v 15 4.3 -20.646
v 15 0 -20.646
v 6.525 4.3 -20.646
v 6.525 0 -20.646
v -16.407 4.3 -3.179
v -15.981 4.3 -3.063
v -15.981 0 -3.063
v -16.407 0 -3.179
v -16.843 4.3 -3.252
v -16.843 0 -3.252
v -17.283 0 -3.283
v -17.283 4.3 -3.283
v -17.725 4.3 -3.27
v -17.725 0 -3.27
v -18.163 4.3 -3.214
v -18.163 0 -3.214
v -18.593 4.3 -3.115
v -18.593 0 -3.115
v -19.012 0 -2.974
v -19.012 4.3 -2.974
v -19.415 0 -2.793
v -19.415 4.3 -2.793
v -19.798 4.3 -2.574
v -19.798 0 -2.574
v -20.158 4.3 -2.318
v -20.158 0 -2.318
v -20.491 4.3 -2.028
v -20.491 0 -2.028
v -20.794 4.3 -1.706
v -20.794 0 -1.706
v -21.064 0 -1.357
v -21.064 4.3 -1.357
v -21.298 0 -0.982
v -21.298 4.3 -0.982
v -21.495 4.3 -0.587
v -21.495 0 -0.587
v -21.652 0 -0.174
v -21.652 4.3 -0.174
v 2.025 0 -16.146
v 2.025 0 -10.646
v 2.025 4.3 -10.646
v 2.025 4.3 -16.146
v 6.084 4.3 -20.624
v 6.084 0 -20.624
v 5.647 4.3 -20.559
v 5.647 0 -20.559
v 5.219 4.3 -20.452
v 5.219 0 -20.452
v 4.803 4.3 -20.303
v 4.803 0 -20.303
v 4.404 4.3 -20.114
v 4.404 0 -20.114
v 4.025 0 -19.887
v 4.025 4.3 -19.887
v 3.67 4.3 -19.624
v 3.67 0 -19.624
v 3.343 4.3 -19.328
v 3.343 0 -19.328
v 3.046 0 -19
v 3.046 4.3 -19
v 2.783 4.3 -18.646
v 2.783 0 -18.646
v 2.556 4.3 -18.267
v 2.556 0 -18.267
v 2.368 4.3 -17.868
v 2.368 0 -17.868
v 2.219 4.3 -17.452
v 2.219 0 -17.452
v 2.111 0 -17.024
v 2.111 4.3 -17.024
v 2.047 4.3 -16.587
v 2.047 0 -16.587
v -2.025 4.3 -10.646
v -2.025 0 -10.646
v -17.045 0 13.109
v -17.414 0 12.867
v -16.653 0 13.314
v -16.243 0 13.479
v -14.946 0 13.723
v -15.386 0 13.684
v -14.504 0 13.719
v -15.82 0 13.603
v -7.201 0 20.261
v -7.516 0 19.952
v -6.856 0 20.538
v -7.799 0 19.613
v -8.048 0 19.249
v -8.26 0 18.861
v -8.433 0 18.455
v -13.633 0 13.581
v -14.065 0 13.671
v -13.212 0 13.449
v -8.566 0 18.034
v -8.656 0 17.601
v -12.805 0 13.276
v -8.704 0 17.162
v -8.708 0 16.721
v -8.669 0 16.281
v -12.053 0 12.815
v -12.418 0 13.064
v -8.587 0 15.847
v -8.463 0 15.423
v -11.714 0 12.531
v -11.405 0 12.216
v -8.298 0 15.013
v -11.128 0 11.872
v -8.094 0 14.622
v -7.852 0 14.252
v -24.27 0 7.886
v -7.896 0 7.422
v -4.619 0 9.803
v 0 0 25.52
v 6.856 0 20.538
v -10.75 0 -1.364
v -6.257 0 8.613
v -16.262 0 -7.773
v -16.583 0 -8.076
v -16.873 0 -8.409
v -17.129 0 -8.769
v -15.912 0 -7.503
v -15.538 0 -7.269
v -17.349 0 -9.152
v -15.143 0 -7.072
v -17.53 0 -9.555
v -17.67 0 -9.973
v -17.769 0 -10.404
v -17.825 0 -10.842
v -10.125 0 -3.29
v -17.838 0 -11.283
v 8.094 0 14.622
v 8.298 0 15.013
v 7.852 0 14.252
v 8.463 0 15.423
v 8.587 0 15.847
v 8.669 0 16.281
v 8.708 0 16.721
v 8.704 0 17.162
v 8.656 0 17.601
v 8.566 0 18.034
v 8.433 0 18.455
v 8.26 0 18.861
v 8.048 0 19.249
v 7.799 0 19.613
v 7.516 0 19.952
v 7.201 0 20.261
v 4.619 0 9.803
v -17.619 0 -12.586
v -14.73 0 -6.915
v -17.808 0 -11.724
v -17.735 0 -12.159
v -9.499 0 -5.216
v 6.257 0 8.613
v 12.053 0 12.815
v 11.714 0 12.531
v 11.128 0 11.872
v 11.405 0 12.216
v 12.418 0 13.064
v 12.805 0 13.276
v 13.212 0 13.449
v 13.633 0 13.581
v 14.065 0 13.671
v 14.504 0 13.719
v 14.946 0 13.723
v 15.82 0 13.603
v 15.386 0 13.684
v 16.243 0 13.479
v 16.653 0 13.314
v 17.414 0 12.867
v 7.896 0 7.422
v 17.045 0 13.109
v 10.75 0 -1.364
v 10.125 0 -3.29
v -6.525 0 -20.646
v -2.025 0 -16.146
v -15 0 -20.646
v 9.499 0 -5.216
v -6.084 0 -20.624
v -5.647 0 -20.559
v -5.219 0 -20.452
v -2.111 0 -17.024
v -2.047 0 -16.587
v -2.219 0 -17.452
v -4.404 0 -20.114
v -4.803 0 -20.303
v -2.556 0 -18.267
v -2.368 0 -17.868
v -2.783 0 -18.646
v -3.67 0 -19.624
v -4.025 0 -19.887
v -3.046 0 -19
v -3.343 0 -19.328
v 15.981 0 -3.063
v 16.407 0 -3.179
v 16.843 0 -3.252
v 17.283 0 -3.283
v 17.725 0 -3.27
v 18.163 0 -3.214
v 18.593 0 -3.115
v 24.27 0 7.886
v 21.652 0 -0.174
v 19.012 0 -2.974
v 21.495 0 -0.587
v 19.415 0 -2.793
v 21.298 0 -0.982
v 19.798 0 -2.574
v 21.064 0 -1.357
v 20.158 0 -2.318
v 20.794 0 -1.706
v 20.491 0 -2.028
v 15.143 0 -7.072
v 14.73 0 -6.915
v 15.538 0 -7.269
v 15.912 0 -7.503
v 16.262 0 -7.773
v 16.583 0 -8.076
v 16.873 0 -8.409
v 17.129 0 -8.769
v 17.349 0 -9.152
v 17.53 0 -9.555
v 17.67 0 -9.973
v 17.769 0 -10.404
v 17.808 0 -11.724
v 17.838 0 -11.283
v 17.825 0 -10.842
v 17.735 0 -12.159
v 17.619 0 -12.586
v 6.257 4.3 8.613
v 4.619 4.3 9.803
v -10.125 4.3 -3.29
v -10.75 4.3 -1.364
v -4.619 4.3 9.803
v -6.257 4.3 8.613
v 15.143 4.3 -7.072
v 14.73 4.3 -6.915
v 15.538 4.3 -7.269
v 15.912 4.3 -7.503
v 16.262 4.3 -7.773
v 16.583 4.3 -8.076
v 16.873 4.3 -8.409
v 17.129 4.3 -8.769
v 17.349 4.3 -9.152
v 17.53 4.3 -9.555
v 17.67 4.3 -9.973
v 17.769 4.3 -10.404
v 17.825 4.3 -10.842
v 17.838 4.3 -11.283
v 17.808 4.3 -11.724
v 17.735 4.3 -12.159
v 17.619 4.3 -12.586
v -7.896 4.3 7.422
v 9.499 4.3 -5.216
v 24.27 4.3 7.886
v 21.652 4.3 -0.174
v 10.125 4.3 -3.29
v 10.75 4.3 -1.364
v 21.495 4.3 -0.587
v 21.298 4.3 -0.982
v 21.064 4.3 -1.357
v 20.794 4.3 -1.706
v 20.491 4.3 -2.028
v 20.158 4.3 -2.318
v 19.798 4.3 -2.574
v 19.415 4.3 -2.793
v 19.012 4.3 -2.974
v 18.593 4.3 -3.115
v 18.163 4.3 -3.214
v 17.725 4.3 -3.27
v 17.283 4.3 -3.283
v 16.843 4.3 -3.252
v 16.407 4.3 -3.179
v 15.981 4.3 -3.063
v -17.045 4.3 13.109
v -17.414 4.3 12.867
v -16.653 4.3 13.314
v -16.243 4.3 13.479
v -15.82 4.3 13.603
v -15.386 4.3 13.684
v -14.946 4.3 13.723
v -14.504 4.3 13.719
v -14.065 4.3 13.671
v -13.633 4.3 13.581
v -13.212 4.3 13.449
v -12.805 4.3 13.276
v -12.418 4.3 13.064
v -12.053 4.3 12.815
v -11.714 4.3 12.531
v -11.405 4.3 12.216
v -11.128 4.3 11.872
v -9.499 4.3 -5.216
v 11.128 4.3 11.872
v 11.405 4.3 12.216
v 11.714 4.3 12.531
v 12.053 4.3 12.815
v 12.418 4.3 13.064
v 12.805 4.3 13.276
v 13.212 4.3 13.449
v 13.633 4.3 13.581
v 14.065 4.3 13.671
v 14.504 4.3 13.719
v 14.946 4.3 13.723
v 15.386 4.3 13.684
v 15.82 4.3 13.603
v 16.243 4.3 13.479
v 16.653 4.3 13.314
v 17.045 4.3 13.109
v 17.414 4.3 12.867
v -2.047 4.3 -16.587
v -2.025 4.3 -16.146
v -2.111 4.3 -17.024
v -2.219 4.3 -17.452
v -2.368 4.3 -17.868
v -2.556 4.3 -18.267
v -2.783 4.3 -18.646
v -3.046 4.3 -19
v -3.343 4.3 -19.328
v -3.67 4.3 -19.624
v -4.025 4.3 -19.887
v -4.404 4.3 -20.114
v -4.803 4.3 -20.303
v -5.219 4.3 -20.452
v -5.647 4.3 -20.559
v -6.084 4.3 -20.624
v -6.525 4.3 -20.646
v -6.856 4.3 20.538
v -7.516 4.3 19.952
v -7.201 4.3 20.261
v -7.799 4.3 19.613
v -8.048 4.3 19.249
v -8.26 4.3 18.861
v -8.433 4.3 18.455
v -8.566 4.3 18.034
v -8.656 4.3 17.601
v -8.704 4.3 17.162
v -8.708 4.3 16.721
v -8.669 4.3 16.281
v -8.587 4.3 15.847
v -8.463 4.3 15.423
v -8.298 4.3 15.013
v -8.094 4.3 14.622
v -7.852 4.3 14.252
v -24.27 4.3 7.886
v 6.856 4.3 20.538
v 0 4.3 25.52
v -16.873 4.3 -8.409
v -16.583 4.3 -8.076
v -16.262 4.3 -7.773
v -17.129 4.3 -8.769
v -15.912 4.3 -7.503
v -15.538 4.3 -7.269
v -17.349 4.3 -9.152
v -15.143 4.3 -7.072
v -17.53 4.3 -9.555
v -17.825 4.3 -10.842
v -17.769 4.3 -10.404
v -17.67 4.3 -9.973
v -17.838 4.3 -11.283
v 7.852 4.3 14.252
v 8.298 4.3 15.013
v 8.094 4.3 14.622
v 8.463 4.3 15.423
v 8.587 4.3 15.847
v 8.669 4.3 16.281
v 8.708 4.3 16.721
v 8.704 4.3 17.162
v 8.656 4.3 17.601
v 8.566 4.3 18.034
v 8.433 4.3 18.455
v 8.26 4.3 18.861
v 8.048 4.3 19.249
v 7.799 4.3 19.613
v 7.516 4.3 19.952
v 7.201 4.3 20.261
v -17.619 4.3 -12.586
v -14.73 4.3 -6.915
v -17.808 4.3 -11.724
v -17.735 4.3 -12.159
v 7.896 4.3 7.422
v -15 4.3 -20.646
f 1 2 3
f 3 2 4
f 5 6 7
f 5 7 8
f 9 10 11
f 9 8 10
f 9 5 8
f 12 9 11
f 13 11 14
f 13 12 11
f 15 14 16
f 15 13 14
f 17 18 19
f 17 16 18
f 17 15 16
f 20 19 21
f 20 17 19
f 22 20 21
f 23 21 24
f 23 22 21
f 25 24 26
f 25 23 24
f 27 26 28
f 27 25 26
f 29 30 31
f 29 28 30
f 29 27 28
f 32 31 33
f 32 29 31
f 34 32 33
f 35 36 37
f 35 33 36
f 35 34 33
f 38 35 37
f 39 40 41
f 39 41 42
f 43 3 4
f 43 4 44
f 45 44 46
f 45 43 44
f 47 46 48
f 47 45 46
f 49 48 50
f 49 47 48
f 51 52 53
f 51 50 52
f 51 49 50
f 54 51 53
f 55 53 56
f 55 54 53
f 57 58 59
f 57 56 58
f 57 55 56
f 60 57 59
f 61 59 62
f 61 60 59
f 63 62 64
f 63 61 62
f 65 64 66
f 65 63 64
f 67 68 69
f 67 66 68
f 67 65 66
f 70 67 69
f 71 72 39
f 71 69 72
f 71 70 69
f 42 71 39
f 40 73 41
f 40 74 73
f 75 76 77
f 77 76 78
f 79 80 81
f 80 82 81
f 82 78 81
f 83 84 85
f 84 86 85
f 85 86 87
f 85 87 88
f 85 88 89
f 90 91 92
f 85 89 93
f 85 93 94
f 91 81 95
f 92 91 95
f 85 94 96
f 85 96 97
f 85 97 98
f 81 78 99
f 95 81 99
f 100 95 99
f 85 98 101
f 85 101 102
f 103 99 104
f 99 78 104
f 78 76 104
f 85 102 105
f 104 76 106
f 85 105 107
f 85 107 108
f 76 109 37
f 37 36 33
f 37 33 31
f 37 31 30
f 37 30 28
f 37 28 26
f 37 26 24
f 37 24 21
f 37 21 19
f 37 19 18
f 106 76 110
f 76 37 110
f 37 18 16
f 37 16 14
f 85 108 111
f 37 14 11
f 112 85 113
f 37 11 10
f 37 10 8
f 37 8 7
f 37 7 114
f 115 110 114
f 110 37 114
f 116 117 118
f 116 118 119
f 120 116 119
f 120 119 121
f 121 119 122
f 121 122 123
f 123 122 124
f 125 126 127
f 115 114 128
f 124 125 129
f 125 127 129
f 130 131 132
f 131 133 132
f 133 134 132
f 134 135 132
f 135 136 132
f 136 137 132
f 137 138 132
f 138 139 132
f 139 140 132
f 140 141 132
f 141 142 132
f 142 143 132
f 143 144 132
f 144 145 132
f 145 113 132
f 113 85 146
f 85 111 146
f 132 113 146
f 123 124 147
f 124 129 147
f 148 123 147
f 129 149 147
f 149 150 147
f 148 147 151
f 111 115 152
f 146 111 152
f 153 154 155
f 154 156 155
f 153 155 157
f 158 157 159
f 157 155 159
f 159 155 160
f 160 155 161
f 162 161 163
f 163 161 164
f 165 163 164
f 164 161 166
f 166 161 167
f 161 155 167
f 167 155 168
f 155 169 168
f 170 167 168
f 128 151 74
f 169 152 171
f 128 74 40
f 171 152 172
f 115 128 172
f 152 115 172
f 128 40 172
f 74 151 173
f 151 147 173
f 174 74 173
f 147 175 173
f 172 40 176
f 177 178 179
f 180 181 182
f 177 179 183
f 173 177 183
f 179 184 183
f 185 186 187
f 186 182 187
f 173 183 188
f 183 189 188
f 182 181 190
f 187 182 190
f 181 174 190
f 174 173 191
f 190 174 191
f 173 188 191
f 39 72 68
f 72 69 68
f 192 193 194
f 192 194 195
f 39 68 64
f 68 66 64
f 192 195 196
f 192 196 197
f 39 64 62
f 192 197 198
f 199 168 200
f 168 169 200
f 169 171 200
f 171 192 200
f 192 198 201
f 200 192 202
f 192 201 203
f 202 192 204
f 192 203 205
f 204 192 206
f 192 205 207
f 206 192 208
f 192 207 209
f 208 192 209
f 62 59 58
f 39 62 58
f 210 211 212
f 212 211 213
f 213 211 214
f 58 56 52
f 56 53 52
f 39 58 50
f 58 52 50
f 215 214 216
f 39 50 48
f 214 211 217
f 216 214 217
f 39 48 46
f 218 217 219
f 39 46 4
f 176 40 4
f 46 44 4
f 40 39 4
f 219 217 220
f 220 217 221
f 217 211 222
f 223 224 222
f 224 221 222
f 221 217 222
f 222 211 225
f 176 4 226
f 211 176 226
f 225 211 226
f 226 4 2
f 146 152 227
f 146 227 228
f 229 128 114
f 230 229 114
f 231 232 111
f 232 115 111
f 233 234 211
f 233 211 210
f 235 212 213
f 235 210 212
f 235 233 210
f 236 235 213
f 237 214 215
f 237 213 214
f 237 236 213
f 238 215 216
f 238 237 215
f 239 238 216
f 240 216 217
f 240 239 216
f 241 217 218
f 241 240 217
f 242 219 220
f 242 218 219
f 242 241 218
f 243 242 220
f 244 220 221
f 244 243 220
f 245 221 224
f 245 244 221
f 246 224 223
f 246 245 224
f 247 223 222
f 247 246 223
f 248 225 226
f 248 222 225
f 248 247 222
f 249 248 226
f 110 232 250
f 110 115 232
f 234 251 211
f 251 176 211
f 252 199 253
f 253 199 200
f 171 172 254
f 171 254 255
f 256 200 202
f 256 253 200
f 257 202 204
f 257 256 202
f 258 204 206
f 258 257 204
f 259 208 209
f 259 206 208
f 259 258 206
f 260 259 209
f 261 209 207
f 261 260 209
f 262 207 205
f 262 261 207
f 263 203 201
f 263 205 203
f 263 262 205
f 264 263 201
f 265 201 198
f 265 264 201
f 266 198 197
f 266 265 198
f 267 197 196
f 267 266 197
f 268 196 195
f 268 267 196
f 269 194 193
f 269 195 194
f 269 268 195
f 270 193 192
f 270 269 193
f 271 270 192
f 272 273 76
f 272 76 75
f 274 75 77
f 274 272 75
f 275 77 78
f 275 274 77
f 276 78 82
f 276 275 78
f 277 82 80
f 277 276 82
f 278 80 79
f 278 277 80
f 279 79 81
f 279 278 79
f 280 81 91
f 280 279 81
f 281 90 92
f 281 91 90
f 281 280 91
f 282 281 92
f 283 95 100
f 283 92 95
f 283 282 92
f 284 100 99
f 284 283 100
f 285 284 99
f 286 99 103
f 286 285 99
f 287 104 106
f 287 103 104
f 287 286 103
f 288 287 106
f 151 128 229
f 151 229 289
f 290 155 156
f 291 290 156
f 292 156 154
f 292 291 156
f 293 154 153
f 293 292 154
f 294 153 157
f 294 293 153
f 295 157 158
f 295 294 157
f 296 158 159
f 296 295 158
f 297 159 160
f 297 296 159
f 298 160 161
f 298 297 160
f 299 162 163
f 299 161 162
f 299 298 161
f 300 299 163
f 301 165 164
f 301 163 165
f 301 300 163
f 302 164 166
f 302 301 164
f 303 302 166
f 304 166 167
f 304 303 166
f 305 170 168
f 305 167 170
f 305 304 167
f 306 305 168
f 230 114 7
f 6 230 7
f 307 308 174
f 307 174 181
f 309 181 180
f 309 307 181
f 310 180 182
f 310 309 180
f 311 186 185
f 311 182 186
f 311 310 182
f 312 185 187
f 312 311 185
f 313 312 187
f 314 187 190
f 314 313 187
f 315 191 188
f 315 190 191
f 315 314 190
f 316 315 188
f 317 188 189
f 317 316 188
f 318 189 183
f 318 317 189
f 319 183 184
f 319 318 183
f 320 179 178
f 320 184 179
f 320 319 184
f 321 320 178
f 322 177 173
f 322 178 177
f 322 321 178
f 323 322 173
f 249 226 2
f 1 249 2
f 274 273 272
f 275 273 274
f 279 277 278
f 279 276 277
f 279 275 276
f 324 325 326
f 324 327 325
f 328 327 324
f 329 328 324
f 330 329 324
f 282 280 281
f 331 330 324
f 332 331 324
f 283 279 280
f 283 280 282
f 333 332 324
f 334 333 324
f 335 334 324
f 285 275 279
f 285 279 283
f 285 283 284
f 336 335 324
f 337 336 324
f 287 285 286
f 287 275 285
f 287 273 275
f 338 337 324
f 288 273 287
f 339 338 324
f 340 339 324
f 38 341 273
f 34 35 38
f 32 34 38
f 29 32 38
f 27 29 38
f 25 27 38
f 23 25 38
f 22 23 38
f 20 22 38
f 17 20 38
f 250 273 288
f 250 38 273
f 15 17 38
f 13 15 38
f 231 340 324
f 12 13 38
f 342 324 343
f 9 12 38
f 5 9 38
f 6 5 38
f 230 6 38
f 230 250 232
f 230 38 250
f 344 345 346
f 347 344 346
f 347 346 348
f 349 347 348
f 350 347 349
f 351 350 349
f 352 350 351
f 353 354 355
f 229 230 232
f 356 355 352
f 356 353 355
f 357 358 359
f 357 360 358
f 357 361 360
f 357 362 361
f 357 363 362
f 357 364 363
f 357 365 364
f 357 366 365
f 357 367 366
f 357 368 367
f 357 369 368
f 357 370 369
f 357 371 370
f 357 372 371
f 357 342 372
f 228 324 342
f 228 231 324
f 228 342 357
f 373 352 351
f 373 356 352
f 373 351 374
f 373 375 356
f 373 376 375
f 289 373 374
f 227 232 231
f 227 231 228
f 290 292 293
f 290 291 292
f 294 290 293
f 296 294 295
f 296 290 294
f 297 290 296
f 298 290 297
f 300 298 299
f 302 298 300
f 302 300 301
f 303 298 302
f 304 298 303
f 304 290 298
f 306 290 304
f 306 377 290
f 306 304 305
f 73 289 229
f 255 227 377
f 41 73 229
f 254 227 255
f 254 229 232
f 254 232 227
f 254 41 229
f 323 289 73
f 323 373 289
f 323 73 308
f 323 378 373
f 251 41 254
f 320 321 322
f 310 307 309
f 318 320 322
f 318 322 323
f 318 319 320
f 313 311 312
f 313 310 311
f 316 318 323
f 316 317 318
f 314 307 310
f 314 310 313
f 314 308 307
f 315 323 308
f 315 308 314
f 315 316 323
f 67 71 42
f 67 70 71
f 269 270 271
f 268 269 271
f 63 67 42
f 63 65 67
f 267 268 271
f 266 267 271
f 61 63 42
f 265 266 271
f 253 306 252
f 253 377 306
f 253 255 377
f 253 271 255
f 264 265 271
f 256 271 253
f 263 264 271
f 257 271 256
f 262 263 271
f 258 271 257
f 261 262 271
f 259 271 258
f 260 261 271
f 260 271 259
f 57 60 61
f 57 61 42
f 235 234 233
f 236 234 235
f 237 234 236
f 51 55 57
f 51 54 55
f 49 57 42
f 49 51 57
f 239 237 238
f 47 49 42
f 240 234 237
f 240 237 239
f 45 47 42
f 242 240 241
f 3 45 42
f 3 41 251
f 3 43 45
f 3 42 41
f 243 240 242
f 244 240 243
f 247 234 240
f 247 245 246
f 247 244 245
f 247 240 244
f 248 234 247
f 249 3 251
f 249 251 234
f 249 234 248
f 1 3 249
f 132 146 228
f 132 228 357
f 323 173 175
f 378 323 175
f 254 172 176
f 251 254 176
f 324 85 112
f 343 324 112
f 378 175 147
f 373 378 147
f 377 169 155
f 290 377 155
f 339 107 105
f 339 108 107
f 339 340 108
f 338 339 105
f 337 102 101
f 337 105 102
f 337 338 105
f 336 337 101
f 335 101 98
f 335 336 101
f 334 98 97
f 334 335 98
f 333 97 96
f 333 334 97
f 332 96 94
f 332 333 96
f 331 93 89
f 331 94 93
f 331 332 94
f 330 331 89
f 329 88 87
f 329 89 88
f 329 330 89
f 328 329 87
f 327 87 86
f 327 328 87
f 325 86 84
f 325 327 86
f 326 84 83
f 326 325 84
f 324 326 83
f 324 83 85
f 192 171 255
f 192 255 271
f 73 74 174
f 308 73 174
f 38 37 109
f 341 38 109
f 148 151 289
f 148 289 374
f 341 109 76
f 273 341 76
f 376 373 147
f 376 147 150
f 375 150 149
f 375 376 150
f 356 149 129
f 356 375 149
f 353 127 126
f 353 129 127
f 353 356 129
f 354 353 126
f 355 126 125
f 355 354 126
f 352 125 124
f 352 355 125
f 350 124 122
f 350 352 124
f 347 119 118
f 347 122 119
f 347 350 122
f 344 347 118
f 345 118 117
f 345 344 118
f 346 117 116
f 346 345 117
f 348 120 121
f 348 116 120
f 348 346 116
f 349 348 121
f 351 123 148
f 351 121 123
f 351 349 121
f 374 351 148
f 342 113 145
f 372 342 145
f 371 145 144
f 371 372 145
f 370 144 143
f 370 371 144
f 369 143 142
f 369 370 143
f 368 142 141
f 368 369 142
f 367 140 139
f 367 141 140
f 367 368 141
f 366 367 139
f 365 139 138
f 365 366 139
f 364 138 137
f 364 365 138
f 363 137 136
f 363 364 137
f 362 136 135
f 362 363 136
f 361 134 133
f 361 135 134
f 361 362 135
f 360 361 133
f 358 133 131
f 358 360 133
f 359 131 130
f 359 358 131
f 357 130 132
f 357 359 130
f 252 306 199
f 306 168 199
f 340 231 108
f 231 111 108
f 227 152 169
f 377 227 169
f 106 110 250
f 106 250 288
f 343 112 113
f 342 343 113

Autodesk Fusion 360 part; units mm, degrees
sketch "Sketch1" plane through (0, 0, 0) normal (0, 1, 0) x (1, 0, 0)
  line L0 (0, 10.6457) -> (2.025, 10.6457)
  line L1 (2.025, 10.6457) -> (2.025, 20.6457)
  line L2 (-2.025, 10.6457) -> (-2.025, 20.6457)
  line L3 (0, 10.6457) -> (-2.025, 10.6457)
  line L4 (-9.4989, 5.2156) -> (-19.0095, 8.3058)
  line L5 (-10.7504, 1.3638) -> (-20.261, 4.454)
  line L6 (-10.1247, 3.2897) -> (-10.7504, 1.3638)
  line L7 (-10.1247, 3.2897) -> (-9.4989, 5.2156)
  line L8 (-7.8957, -7.4223) -> (-13.7735, -15.5125)
  line L9 (-4.6191, -9.8028) -> (-10.497, -17.893)
  line L10 (-6.2574, -8.6126) -> (-4.6191, -9.8028)
  line L11 (-6.2574, -8.6126) -> (-7.8957, -7.4223)
  line L12 (4.6191, -9.8028) -> (10.497, -17.893)
  line L13 (7.8957, -7.4223) -> (13.7735, -15.5125)
  line L14 (6.2574, -8.6126) -> (7.8957, -7.4223)
  line L15 (6.2574, -8.6126) -> (4.6191, -9.8028)
  line L16 (10.7504, 1.3638) -> (20.261, 4.454)
  line L17 (9.4989, 5.2156) -> (19.0095, 8.3058)
  line L18 (10.1247, 3.2897) -> (9.4989, 5.2156)
  line L19 (10.1247, 3.2897) -> (10.7504, 1.3638)
  line L20 (-24.2705, -7.886) -> (-13.7735, -15.5125)
  line L21 (-10.497, -17.893) -> (0, -25.5195)
  line L22 (-15, 20.6457) -> (-19.0095, 8.3058)
  line L23 (-20.261, 4.454) -> (-24.2705, -7.886)
  line L24 (15, 20.6457) -> (2.025, 20.6457)
  line L25 (-2.025, 20.6457) -> (-15, 20.6457)
  line L26 (24.2705, -7.886) -> (20.261, 4.454)
  line L27 (19.0095, 8.3058) -> (15, 20.6457)
  line L28 (0, -25.5195) -> (10.497, -17.893)
  line L29 (13.7735, -15.5125) -> (24.2705, -7.886)
  dimension "d9" = 360
extrude "Extrude1" add sketch "Sketch1" along normal blind 4.3
fillet "Fillet1" radius 4.5 10 edges at (-2.025, 2.15, -20.6457) (2.025, 2.15, -20.6457) (19.0095, 2.15, -8.3058) (20.261, 2.15, -4.454) (10.497, 2.15, 17.893) (13.7735, 2.15, 15.5125) (-19.0095, 2.15, -8.3058) (-20.261, 2.15, -4.454) (-13.7735, 2.15, 15.5125) (-10.497, 2.15, 17.893)
sketch "Sketch2" plane through (0, 4.3, 0) normal (0, 1, 0) x (-1, 0, 0)
  arc A0 (7.852, 14.2524) -> (6.8564, 20.538) centre (4.2114, 16.8975) ccw
  line L0 (6.8564, 20.538) -> (0, 25.5195)
  line L1 (0, 25.5195) -> (-6.8564, 20.538)
  arc A1 (-6.8564, 20.538) -> (-7.852, 14.2524) centre (-4.2114, 16.8975) ccw
  line L2 (-7.852, 14.2524) -> (-4.6191, 9.8028)
  line L3 (-4.6191, 9.8028) -> (-7.8957, 7.4223)
  line L4 (-7.8957, 7.4223) -> (-11.1285, 11.8719)
  arc A2 (-11.1285, 11.8719) -> (-17.4141, 12.8674) centre (-14.7691, 9.2269) ccw
  line L5 (-17.4141, 12.8674) -> (-24.2705, 7.886)
  line L6 (-24.2705, 7.886) -> (-21.6516, -0.1742)
  arc A3 (-21.6516, -0.1742) -> (-15.9813, -3.0634) centre (-17.3718, 1.2163) ccw
  line L7 (-15.9813, -3.0634) -> (-10.7504, -1.3638)
  line L8 (-10.7504, -1.3638) -> (-9.4989, -5.2156)
  line L9 (-9.4989, -5.2156) -> (-14.7297, -6.9152)
  arc A4 (-14.7297, -6.9152) -> (-17.6189, -12.5855) centre (-13.3392, -11.1949) ccw
  line L10 (-17.6189, -12.5855) -> (-15, -20.6457)
  line L11 (-15, -20.6457) -> (-6.525, -20.6457)
  arc A5 (-6.525, -20.6457) -> (-2.025, -16.1457) centre (-6.525, -16.1457) ccw
  line L12 (-2.025, -16.1457) -> (-2.025, -10.6457)
  line L13 (-2.025, -10.6457) -> (2.025, -10.6457)
  line L14 (2.025, -10.6457) -> (2.025, -16.1457)
  arc A6 (2.025, -16.1457) -> (6.525, -20.6457) centre (6.525, -16.1457) ccw
  line L15 (6.525, -20.6457) -> (15, -20.6457)
  line L16 (15, -20.6457) -> (17.6189, -12.5855)
  arc A7 (17.6189, -12.5855) -> (14.7297, -6.9152) centre (13.3392, -11.1949) ccw
  line L17 (14.7297, -6.9152) -> (9.4989, -5.2156)
  line L18 (9.4989, -5.2156) -> (10.7504, -1.3638)
  line L19 (10.7504, -1.3638) -> (15.9813, -3.0634)
  arc A8 (15.9813, -3.0634) -> (21.6516, -0.1742) centre (17.3718, 1.2163) ccw
  line L20 (21.6516, -0.1742) -> (24.2705, 7.886)
  line L21 (24.2705, 7.886) -> (17.4141, 12.8674)
  arc A9 (17.4141, 12.8674) -> (11.1285, 11.8719) centre (14.7691, 9.2269) ccw
  line L22 (11.1285, 11.8719) -> (7.8957, 7.4223)
  line L23 (7.8957, 7.4223) -> (4.6191, 9.8028)
  line L24 (4.6191, 9.8028) -> (7.852, 14.2524)
equation "thickness = 4.3 mm"
equation "notch_depth = 7 mm"
equation "length = 30 mm"
equation "kerf = 0.25 mm"
equation "d10 = thickness"
